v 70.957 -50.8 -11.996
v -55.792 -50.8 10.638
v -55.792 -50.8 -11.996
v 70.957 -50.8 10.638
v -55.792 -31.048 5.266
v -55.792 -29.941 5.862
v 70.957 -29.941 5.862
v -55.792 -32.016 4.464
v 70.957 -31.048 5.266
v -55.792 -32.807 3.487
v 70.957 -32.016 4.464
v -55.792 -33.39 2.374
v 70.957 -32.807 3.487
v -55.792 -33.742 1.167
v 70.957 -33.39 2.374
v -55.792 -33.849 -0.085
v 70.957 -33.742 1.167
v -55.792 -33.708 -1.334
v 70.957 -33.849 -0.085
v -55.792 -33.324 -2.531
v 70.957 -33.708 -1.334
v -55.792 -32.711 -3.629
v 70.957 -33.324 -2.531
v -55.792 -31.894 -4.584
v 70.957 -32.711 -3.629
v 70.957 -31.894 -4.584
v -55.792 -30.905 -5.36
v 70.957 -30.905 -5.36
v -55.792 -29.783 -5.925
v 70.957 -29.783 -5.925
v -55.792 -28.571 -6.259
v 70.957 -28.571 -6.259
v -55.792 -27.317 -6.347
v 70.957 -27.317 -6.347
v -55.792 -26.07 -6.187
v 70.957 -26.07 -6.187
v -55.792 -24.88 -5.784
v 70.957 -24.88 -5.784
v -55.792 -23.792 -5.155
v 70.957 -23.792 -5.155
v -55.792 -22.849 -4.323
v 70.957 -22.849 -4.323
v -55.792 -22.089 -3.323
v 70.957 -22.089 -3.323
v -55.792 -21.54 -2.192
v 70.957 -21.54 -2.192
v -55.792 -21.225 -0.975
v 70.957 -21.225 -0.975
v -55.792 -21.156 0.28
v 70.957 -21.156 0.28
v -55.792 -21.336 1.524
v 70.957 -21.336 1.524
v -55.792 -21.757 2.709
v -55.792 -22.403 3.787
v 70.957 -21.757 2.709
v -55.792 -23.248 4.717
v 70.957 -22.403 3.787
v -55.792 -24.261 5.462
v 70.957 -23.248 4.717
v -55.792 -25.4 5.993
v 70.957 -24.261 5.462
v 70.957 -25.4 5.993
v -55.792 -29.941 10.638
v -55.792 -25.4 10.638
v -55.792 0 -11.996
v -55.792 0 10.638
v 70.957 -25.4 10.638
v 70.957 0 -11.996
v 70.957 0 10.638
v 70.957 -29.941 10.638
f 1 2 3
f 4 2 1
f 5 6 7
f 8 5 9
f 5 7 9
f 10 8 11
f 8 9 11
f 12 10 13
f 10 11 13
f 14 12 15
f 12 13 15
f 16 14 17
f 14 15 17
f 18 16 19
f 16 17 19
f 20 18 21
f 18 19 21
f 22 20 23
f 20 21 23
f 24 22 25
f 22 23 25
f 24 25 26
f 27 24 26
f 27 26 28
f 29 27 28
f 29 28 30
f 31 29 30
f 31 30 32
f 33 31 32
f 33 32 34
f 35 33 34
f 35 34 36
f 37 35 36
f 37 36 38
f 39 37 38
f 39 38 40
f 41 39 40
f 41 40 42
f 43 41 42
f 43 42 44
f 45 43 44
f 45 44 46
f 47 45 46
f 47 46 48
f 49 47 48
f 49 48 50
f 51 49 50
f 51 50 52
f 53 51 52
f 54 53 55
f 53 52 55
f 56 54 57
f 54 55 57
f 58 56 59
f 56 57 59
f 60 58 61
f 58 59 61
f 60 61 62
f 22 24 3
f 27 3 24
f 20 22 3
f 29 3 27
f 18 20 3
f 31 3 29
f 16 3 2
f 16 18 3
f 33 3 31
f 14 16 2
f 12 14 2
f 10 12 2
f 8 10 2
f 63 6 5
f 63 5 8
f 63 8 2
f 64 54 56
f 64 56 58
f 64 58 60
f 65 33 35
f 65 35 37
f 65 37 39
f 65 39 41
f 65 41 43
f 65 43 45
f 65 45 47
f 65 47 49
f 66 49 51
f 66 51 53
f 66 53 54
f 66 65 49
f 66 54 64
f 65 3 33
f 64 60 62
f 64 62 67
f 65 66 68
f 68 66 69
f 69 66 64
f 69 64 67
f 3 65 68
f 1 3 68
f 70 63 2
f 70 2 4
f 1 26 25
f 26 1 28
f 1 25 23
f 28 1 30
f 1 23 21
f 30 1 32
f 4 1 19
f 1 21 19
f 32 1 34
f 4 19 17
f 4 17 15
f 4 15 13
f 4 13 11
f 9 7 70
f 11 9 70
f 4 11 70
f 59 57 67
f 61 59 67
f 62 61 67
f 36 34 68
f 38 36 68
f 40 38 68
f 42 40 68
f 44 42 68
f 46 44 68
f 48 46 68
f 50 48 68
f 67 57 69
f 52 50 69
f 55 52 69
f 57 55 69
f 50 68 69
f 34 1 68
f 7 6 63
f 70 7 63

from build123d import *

# Parameters (mm, degrees)
F0_W     = 126.748518
F0_H     = 22.633665
F1_DEPTH = 50.8
F3_D     = 12.7
F4_W     = 4.541321
F4_H     = 4.775913
F5_DEPTH = 254


with BuildPart() as f1:
    # F0 (on Front) → F1 (new body)
    with BuildSketch(Plane.XZ):
        with Locations((7.582277, -0.67901)):
            Rectangle(F0_W, F0_H)
    extrude(amount=F1_DEPTH)

    # F3 (through all)
    with Locations(Plane(origin=(-55.791982, 0, 0), x_dir=(0, -1, 0), z_dir=(-1, 0, 0))):
        with Locations((27.499903, 0)):
            Hole(F3_D / 2)

    # F4 (on face) → F5 (cut)
    with BuildSketch(Plane(origin=(-55.791982, 0, 0), x_dir=(0, -1, 0), z_dir=(-1, 0, 0))):
        with Locations((27.67066, 8.249866)):
            Rectangle(F4_W, F4_H)
    extrude(amount=-F5_DEPTH, mode=Mode.SUBTRACT)


solid = f1.part
